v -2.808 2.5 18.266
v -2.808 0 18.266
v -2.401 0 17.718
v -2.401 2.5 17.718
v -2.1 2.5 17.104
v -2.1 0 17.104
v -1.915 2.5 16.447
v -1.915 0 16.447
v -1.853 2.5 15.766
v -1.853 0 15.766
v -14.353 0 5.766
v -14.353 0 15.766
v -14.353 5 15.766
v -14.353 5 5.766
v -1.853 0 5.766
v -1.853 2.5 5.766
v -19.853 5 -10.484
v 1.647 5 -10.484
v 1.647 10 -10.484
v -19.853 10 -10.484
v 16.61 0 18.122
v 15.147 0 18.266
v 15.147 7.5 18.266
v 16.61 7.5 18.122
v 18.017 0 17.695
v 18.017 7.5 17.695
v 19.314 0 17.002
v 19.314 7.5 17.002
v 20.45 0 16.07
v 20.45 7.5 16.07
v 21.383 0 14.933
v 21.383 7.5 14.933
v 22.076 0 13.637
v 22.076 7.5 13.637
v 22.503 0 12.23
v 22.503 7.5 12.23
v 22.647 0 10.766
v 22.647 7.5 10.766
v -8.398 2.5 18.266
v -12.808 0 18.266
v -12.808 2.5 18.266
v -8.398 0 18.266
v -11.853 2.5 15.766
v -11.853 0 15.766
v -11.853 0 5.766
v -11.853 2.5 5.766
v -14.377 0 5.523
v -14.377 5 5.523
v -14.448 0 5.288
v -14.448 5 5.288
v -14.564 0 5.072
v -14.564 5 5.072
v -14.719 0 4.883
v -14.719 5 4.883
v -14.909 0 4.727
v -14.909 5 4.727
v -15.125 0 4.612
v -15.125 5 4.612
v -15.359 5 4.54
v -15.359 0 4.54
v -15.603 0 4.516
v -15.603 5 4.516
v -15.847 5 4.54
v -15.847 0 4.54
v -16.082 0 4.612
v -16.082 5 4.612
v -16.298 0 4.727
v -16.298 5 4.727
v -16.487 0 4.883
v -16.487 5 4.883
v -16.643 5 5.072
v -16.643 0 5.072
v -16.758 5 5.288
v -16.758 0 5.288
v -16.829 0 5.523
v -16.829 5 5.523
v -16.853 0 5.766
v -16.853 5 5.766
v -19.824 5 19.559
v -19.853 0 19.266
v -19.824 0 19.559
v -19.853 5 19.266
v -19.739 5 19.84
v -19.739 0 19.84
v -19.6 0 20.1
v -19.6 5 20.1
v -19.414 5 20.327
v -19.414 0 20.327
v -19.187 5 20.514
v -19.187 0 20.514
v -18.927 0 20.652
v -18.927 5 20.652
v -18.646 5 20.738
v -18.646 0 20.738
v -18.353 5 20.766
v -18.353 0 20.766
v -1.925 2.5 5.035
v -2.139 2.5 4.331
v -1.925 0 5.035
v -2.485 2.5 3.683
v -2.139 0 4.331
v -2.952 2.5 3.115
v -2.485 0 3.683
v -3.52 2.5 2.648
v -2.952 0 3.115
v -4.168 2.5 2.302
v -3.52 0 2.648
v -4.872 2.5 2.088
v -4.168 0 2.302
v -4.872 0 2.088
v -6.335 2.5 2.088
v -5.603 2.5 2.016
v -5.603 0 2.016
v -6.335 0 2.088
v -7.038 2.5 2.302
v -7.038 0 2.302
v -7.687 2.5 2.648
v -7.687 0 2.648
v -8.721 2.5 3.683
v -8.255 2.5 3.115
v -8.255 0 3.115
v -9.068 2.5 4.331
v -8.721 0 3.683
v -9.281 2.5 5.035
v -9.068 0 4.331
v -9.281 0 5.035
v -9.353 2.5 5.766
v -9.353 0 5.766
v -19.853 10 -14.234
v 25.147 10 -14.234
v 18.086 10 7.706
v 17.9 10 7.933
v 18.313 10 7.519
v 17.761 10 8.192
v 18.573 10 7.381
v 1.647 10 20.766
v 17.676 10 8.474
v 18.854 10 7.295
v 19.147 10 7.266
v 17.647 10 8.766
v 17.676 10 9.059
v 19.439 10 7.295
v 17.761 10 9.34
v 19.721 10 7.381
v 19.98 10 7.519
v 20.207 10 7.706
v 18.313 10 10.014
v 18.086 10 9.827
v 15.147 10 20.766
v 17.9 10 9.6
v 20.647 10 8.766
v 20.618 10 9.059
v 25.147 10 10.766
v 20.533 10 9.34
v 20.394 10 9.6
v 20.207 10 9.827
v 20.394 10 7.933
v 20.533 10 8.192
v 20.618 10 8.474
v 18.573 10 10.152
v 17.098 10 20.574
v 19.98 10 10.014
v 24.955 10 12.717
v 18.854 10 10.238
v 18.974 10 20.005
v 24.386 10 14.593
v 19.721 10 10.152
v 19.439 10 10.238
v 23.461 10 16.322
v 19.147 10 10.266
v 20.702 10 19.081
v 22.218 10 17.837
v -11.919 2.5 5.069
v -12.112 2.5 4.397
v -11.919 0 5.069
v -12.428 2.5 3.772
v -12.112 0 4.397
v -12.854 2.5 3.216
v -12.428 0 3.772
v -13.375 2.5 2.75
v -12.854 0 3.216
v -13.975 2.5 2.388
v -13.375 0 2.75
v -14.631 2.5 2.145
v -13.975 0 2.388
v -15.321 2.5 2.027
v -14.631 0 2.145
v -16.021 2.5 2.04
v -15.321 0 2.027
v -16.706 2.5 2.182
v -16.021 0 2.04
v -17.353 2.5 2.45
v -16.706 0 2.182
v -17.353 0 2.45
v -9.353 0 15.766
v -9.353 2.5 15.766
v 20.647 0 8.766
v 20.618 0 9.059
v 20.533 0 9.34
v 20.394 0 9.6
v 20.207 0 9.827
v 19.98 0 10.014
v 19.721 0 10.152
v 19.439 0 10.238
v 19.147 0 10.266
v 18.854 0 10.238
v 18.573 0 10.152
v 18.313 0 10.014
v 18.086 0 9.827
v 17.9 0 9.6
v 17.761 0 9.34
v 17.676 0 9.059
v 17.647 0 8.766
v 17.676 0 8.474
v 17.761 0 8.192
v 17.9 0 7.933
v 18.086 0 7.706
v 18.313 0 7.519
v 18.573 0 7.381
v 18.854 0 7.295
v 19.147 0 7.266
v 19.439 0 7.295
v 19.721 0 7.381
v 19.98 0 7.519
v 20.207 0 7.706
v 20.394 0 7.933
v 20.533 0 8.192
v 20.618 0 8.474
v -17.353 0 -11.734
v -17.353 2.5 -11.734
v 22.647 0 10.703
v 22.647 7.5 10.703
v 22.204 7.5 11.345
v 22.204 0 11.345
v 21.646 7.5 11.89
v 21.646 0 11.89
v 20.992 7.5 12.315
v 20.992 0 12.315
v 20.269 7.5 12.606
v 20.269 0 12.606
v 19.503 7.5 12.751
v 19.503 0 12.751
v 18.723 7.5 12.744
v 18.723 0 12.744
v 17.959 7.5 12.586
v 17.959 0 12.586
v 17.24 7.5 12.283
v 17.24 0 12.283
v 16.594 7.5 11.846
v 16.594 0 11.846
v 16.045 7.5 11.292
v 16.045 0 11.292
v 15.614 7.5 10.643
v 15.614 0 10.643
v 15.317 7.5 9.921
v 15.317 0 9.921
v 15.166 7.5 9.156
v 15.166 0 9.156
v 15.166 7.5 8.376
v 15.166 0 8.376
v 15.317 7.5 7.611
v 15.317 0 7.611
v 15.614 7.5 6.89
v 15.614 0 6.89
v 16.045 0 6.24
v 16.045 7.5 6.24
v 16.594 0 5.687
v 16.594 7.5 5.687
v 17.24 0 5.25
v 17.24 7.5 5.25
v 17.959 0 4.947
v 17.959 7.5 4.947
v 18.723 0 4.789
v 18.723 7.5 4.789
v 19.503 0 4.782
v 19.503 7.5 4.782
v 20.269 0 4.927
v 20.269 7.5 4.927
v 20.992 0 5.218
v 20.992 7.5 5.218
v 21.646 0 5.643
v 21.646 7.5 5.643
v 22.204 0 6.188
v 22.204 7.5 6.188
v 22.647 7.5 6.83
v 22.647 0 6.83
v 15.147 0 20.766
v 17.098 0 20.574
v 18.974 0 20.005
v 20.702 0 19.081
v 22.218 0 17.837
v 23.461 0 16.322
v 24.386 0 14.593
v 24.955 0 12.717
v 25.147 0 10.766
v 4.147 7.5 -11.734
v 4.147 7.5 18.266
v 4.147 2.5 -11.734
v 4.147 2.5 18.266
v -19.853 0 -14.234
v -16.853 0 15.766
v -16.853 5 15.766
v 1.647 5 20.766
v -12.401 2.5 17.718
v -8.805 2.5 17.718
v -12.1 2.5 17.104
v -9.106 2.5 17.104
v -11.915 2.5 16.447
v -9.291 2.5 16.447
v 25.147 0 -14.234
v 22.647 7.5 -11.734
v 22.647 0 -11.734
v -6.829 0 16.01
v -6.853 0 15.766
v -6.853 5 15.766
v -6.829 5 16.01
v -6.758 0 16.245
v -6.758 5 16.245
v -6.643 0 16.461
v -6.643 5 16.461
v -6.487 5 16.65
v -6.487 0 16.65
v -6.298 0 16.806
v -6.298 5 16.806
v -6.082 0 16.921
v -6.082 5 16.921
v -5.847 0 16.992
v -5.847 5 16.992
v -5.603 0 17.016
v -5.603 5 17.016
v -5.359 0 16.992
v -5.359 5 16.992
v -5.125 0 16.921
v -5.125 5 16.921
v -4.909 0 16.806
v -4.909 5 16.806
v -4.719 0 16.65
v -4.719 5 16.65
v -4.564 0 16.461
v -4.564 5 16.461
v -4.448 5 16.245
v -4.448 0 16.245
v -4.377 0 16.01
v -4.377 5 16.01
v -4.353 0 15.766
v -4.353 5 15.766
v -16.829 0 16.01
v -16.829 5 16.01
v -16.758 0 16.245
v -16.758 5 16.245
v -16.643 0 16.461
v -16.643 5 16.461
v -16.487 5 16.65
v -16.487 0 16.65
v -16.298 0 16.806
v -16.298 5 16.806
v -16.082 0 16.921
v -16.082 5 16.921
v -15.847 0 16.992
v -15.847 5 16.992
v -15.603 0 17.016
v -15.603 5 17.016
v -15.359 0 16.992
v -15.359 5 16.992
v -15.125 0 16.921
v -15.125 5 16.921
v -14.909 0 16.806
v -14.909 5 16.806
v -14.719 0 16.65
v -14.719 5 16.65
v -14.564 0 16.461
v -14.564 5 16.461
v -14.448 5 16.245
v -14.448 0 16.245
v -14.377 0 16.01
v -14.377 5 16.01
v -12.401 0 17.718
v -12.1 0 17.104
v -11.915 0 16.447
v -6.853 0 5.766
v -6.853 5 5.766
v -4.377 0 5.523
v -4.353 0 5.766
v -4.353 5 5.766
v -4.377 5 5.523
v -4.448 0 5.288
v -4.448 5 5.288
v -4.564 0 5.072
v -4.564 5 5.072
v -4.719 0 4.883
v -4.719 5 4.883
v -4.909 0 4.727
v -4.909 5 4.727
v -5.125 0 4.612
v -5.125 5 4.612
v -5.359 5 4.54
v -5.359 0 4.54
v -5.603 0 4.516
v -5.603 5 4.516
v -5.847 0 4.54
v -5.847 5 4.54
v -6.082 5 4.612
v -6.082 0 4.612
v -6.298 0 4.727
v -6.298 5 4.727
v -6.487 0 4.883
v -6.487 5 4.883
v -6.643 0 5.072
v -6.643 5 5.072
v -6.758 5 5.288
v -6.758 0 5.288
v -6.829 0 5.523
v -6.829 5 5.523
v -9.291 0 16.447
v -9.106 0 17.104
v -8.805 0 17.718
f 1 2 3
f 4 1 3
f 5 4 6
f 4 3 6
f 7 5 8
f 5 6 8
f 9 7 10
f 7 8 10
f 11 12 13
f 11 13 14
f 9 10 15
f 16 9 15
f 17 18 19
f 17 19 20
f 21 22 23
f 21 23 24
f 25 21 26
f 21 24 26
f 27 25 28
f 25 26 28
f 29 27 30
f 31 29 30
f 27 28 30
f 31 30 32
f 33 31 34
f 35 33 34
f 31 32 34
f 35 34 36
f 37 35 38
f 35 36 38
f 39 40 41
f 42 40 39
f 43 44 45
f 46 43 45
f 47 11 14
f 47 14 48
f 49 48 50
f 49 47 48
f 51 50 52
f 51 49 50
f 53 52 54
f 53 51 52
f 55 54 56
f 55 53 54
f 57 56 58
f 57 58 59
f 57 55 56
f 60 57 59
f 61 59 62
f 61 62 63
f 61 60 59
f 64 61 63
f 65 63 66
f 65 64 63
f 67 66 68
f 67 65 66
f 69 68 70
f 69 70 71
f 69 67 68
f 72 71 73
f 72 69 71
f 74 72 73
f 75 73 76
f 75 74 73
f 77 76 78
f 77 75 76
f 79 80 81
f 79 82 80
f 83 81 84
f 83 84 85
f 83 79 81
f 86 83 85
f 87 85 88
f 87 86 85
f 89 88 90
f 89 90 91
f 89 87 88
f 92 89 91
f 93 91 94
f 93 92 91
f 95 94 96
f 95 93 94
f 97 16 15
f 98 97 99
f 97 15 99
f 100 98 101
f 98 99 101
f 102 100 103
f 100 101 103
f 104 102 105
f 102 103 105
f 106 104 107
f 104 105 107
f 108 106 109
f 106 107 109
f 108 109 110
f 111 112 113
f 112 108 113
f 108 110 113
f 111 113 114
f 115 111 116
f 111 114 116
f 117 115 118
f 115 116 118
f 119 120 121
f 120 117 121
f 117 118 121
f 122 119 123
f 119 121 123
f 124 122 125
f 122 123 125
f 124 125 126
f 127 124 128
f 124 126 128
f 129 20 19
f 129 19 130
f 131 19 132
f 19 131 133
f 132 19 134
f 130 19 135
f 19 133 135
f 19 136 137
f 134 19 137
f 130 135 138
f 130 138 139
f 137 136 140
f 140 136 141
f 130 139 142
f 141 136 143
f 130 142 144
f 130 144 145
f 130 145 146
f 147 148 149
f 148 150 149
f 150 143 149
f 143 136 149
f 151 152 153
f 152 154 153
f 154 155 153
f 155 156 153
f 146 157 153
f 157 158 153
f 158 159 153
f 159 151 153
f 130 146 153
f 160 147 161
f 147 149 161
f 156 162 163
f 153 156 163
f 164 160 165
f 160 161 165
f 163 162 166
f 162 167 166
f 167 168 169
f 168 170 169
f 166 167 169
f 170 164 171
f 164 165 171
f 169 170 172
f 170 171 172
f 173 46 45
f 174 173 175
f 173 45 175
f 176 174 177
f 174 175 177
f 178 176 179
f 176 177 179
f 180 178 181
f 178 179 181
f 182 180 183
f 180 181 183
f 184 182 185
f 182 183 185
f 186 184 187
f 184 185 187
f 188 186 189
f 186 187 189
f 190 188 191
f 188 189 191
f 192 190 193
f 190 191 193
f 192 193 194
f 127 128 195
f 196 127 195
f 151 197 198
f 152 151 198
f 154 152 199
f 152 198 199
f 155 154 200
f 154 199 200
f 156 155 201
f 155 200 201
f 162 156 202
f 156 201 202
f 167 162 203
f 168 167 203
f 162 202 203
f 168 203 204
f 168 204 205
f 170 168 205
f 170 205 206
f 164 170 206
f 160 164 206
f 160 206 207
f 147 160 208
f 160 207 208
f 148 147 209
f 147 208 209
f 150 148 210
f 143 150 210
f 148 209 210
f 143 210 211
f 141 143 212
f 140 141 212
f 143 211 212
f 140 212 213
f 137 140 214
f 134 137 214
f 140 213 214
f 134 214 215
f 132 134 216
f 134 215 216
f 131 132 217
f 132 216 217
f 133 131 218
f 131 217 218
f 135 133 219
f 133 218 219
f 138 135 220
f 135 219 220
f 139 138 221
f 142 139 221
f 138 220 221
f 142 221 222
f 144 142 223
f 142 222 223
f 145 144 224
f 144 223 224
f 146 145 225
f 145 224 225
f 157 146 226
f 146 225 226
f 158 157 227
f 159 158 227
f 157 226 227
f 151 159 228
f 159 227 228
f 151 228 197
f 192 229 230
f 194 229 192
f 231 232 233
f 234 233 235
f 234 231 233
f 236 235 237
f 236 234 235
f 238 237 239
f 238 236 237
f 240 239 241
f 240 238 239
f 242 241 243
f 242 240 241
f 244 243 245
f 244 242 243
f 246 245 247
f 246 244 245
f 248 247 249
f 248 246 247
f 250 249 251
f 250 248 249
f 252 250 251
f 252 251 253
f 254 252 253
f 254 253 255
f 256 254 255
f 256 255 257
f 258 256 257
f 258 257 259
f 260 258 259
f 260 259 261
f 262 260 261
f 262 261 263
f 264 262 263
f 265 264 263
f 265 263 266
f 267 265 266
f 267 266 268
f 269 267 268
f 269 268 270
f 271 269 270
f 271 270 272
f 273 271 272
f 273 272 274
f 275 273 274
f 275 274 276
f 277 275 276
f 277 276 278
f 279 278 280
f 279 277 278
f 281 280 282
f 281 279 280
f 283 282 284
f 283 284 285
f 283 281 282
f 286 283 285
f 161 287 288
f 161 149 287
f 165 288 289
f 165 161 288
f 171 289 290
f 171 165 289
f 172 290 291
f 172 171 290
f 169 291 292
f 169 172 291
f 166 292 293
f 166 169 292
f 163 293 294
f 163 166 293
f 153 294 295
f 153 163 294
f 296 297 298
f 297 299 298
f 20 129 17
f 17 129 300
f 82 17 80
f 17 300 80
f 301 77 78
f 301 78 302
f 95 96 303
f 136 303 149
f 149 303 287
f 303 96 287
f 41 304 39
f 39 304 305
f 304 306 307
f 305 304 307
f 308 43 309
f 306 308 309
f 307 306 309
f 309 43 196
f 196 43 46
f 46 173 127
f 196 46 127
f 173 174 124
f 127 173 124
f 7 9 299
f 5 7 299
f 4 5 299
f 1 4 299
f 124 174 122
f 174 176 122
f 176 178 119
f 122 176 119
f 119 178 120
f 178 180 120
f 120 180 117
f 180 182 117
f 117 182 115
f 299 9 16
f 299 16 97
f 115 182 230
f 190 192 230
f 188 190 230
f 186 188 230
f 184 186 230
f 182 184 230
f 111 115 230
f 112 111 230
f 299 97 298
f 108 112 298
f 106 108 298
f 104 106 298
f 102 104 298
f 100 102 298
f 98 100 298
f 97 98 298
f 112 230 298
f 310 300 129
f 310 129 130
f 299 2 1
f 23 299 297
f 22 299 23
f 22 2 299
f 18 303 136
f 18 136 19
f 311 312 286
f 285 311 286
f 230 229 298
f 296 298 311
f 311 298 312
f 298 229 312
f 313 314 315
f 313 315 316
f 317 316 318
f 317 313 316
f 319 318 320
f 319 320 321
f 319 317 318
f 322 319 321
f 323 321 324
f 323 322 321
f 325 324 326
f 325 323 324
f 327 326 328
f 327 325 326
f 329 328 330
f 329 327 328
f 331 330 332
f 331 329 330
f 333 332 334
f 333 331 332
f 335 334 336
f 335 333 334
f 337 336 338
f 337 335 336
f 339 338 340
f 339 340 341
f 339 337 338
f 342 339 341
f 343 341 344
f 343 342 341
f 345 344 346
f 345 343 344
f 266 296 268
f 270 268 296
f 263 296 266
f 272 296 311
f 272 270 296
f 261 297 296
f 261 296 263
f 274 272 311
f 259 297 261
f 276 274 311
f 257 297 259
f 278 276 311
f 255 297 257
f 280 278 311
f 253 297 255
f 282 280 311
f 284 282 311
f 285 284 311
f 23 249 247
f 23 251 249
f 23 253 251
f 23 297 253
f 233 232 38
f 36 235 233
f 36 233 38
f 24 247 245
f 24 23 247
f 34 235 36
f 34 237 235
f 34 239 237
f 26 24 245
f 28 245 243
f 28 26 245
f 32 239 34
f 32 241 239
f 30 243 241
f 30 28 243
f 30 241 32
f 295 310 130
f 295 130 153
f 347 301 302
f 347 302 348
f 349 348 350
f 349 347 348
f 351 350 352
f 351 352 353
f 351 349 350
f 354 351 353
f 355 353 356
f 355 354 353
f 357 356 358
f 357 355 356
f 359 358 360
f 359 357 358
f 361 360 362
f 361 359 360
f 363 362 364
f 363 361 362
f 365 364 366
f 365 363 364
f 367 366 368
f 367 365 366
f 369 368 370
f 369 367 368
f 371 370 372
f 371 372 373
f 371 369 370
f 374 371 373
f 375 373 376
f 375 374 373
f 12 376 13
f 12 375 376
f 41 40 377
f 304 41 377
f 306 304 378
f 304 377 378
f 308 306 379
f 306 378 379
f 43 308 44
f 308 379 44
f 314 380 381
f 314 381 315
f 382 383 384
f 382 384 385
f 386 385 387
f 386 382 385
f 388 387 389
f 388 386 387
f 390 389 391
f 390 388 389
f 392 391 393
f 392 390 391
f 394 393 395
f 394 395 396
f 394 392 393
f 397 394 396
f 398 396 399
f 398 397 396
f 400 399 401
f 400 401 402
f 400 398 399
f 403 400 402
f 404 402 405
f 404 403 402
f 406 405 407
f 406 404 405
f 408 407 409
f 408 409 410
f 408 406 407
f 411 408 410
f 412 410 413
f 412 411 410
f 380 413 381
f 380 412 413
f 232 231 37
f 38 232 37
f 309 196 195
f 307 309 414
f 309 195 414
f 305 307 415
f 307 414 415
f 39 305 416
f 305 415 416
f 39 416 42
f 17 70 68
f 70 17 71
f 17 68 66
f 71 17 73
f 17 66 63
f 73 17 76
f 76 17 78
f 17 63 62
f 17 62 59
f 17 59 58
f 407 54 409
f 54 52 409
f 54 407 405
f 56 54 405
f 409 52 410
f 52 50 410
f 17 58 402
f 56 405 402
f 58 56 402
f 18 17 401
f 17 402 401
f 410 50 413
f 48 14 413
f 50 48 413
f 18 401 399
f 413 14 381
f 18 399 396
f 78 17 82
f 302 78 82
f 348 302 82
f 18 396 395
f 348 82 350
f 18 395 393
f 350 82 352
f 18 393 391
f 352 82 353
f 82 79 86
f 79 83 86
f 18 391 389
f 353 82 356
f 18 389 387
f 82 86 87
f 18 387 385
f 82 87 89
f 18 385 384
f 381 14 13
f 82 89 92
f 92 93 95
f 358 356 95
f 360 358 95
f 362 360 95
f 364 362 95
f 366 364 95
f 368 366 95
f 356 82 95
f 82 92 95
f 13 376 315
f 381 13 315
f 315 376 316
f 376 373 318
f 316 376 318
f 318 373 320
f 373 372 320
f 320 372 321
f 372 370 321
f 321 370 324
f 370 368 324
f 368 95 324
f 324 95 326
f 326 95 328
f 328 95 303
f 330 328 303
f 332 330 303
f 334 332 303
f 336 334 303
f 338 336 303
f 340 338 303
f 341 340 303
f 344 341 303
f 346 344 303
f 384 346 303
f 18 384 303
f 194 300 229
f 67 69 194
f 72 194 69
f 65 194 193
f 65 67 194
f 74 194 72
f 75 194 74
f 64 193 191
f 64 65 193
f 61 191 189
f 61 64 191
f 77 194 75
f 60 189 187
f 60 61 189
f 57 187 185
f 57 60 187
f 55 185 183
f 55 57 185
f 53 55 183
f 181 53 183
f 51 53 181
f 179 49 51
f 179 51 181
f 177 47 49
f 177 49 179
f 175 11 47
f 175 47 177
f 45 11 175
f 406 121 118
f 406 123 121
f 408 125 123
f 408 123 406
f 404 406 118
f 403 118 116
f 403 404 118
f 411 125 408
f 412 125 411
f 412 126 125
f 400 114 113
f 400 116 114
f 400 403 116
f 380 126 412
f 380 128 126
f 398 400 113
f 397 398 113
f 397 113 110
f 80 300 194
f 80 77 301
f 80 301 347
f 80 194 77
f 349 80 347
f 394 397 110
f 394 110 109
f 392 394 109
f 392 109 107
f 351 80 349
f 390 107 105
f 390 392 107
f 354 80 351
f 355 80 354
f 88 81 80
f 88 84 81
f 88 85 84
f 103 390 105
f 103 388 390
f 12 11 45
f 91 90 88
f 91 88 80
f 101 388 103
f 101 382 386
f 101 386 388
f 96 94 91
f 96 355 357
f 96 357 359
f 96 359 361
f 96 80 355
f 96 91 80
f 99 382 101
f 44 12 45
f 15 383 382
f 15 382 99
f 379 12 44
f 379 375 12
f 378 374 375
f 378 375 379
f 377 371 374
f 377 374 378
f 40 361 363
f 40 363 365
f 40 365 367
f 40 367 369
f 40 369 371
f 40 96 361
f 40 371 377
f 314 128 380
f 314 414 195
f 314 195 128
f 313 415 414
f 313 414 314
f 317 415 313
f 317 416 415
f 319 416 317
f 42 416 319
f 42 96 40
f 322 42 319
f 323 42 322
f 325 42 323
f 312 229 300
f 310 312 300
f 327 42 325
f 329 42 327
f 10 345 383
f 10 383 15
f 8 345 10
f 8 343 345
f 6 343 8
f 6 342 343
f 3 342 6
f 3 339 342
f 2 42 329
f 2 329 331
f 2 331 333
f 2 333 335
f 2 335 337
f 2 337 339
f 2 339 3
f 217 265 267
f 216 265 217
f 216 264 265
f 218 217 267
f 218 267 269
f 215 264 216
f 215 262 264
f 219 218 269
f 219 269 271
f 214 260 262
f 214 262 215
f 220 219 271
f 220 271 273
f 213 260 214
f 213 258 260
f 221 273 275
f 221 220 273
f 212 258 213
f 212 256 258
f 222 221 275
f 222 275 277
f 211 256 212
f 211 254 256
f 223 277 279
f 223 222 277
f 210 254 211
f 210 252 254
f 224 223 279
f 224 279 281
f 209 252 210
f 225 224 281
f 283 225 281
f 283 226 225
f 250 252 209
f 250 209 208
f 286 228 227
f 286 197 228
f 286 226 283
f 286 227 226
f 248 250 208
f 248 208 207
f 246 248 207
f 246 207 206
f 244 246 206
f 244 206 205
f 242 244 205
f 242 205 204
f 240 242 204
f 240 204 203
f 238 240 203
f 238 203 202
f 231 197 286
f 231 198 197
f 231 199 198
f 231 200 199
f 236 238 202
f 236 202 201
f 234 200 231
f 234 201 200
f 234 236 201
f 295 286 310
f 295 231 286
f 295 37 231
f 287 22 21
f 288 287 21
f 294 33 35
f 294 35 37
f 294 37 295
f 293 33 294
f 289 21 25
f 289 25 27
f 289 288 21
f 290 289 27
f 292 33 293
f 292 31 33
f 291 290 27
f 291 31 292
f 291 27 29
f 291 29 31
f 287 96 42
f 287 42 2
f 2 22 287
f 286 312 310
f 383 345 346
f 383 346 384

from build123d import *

# Parameters (mm, degrees)
F0_R        = 1.5
F1_DEPTH    = 10
F2_R        = 10
F0_W        = 21.5
F0_H        = 31.25
F3_DEPTH    = 5
F4_T        = 2.5
F4_T3_DEPTH = 26.5
F4_T5_DEPTH = 10
F4_T7_DEPTH = 36.25
F5_R        = 1.5


# Not quite as in the source:
# - a shell that OpenCascade refuses in one call is made with other operations: the cavity is built on its own and cut out


with BuildPart() as f1:
    # F0 (on Front) → F1 (new body)
    with BuildSketch(Plane.XZ):
        Polygon((25.1467653117, 20.7663856067), (1.6467653117, 20.7663856067), (1.6467653117, -10.4836143933), (-19.8532346883, -10.4836143933), (-19.8532346883, -14.2336143933), (25.1467653117, -14.2336143933), align=None)
        with Locations((19.1467653117, 8.7663856067)):
            Circle(F0_R, mode=Mode.SUBTRACT)
    extrude(amount=-F1_DEPTH)

    # F2
    f2_edges = [f1.edges().sort_by_distance(p)[0] for p in [
        (25.146765, 5, 20.766386),
    ]]
    fillet(f2_edges, radius=F2_R)

    # F0 (on Front) → F3 (join)
    with BuildSketch(Plane.XZ):
        with Locations((-9.1032346883, 5.1413856067)):
            Rectangle(F0_W, F0_H)
        with BuildLine():
            ThreePointArc((-16.8532346883, 15.7663856067), (-15.6032346883, 17.0163856067), (-14.3532346883, 15.7663856067))
            Line((-14.3532346883, 15.7663856067), (-14.3532346883, 5.7663856067))
            ThreePointArc((-14.3532346883, 5.7663856067), (-15.6032346883, 4.5163856067), (-16.8532346883, 5.7663856067))
            Line((-16.8532346883, 5.7663856067), (-16.8532346883, 15.7663856067))
        make_face(mode=Mode.SUBTRACT)
        with BuildLine():
            ThreePointArc((-6.8532346883, 15.7663856067), (-5.6032346883, 17.0163856067), (-4.3532346883, 15.7663856067))
            Line((-4.3532346883, 15.7663856067), (-4.3532346883, 5.7663856067))
            ThreePointArc((-4.3532346883, 5.7663856067), (-5.6032346883, 4.5163856067), (-6.8532346883, 5.7663856067))
            Line((-6.8532346883, 5.7663856067), (-6.8532346883, 15.7663856067))
        make_face(mode=Mode.SUBTRACT)
    extrude(amount=-F3_DEPTH)

    # F4: shell of thickness 2.5, made by hand


with BuildPart() as f4_core1:
    # F4_t2: copy of F1
    add(f1.part)

    # the walls: a layer under each face that stays
    f4_faces = [f4_core1.faces().sort_by_distance(p)[0] for p in [
        (25.1467653117, 5, -1.7336143933),
        (2.6467653117, 10, 3.2663856067),
        (17.6467653117, 5, 8.7663856067),
        (-9.1032346883, 7.5, -10.4836143933),
        (-9.1032346883, 5, 5.1413856067),
        (-5.6032346883, 2.5, 4.5163856067),
        (-4.3532346883, 2.5, 10.7663856067),
        (-5.6032346883, 2.5, 17.0163856067),
        (-6.8532346883, 2.5, 10.7663856067),
        (-15.6032346883, 2.5, 4.5163856067),
        (-14.3532346883, 2.5, 10.7663856067),
        (-15.6032346883, 2.5, 17.0163856067),
        (-16.8532346883, 2.5, 10.7663856067),
        (1.6467653117, 7.5, 5.1413856067),
        (-19.8532346883, 1.6666666667, 14.9330522734),
        (9.3134319783, 8.3333333333, 20.7663856067),
        (2.6467653117, 5, -14.2336143933),
        (22.2178331235, 5, 17.8374534186),
    ]]
    thicken(f4_faces, amount=-F4_T, mode=Mode.SUBTRACT)

    # F4_s4 → F4_t3 (cut)
    with BuildSketch(Plane.YZ.offset(-22.3532346883)):
        Polygon((5.025, -10.4586143933), (5, -12.9836143933), (2.5, -12.9836143933), (2.5, -10.4836143933), align=None)
    extrude(amount=F4_T3_DEPTH, mode=Mode.SUBTRACT)

    # F4_s6 → F4_t5 (cut)
    with BuildSketch(Plane.XZ.offset(-12.5)):
        Polygon((1.6217653117, -10.4586143933), (1.6467653117, -12.9836143933), (4.1467653117, -12.9836143933), (4.1467653117, -10.4836143933), align=None)
    extrude(amount=F4_T5_DEPTH, mode=Mode.SUBTRACT)

    # F4_s8 → F4_t7 (cut)
    with BuildSketch(Plane.XY.offset(-12.9836143933)):
        Polygon((1.6217653117, 5.025), (1.6467653117, 2.5), (4.1467653117, 2.5), (4.1467653117, 5), align=None)
    extrude(amount=F4_T7_DEPTH, mode=Mode.SUBTRACT)


with BuildPart() as f1_1:
    add(f1.part)

    # what is left inside the walls is the cavity
    f4_cavity = [f4_core1.part.solids().sort_by_distance(p)[0] for p in [
        (2.646765, 0.025, -1.733614),
    ]]
    add(f4_cavity, mode=Mode.SUBTRACT)

    # F5
    f5_edges = [f1_1.edges().sort_by_distance(p)[0] for p in [
        (-19.853235, 2.5, 20.766386),
    ]]
    fillet(f5_edges, radius=F5_R)


solid = f1_1.part
